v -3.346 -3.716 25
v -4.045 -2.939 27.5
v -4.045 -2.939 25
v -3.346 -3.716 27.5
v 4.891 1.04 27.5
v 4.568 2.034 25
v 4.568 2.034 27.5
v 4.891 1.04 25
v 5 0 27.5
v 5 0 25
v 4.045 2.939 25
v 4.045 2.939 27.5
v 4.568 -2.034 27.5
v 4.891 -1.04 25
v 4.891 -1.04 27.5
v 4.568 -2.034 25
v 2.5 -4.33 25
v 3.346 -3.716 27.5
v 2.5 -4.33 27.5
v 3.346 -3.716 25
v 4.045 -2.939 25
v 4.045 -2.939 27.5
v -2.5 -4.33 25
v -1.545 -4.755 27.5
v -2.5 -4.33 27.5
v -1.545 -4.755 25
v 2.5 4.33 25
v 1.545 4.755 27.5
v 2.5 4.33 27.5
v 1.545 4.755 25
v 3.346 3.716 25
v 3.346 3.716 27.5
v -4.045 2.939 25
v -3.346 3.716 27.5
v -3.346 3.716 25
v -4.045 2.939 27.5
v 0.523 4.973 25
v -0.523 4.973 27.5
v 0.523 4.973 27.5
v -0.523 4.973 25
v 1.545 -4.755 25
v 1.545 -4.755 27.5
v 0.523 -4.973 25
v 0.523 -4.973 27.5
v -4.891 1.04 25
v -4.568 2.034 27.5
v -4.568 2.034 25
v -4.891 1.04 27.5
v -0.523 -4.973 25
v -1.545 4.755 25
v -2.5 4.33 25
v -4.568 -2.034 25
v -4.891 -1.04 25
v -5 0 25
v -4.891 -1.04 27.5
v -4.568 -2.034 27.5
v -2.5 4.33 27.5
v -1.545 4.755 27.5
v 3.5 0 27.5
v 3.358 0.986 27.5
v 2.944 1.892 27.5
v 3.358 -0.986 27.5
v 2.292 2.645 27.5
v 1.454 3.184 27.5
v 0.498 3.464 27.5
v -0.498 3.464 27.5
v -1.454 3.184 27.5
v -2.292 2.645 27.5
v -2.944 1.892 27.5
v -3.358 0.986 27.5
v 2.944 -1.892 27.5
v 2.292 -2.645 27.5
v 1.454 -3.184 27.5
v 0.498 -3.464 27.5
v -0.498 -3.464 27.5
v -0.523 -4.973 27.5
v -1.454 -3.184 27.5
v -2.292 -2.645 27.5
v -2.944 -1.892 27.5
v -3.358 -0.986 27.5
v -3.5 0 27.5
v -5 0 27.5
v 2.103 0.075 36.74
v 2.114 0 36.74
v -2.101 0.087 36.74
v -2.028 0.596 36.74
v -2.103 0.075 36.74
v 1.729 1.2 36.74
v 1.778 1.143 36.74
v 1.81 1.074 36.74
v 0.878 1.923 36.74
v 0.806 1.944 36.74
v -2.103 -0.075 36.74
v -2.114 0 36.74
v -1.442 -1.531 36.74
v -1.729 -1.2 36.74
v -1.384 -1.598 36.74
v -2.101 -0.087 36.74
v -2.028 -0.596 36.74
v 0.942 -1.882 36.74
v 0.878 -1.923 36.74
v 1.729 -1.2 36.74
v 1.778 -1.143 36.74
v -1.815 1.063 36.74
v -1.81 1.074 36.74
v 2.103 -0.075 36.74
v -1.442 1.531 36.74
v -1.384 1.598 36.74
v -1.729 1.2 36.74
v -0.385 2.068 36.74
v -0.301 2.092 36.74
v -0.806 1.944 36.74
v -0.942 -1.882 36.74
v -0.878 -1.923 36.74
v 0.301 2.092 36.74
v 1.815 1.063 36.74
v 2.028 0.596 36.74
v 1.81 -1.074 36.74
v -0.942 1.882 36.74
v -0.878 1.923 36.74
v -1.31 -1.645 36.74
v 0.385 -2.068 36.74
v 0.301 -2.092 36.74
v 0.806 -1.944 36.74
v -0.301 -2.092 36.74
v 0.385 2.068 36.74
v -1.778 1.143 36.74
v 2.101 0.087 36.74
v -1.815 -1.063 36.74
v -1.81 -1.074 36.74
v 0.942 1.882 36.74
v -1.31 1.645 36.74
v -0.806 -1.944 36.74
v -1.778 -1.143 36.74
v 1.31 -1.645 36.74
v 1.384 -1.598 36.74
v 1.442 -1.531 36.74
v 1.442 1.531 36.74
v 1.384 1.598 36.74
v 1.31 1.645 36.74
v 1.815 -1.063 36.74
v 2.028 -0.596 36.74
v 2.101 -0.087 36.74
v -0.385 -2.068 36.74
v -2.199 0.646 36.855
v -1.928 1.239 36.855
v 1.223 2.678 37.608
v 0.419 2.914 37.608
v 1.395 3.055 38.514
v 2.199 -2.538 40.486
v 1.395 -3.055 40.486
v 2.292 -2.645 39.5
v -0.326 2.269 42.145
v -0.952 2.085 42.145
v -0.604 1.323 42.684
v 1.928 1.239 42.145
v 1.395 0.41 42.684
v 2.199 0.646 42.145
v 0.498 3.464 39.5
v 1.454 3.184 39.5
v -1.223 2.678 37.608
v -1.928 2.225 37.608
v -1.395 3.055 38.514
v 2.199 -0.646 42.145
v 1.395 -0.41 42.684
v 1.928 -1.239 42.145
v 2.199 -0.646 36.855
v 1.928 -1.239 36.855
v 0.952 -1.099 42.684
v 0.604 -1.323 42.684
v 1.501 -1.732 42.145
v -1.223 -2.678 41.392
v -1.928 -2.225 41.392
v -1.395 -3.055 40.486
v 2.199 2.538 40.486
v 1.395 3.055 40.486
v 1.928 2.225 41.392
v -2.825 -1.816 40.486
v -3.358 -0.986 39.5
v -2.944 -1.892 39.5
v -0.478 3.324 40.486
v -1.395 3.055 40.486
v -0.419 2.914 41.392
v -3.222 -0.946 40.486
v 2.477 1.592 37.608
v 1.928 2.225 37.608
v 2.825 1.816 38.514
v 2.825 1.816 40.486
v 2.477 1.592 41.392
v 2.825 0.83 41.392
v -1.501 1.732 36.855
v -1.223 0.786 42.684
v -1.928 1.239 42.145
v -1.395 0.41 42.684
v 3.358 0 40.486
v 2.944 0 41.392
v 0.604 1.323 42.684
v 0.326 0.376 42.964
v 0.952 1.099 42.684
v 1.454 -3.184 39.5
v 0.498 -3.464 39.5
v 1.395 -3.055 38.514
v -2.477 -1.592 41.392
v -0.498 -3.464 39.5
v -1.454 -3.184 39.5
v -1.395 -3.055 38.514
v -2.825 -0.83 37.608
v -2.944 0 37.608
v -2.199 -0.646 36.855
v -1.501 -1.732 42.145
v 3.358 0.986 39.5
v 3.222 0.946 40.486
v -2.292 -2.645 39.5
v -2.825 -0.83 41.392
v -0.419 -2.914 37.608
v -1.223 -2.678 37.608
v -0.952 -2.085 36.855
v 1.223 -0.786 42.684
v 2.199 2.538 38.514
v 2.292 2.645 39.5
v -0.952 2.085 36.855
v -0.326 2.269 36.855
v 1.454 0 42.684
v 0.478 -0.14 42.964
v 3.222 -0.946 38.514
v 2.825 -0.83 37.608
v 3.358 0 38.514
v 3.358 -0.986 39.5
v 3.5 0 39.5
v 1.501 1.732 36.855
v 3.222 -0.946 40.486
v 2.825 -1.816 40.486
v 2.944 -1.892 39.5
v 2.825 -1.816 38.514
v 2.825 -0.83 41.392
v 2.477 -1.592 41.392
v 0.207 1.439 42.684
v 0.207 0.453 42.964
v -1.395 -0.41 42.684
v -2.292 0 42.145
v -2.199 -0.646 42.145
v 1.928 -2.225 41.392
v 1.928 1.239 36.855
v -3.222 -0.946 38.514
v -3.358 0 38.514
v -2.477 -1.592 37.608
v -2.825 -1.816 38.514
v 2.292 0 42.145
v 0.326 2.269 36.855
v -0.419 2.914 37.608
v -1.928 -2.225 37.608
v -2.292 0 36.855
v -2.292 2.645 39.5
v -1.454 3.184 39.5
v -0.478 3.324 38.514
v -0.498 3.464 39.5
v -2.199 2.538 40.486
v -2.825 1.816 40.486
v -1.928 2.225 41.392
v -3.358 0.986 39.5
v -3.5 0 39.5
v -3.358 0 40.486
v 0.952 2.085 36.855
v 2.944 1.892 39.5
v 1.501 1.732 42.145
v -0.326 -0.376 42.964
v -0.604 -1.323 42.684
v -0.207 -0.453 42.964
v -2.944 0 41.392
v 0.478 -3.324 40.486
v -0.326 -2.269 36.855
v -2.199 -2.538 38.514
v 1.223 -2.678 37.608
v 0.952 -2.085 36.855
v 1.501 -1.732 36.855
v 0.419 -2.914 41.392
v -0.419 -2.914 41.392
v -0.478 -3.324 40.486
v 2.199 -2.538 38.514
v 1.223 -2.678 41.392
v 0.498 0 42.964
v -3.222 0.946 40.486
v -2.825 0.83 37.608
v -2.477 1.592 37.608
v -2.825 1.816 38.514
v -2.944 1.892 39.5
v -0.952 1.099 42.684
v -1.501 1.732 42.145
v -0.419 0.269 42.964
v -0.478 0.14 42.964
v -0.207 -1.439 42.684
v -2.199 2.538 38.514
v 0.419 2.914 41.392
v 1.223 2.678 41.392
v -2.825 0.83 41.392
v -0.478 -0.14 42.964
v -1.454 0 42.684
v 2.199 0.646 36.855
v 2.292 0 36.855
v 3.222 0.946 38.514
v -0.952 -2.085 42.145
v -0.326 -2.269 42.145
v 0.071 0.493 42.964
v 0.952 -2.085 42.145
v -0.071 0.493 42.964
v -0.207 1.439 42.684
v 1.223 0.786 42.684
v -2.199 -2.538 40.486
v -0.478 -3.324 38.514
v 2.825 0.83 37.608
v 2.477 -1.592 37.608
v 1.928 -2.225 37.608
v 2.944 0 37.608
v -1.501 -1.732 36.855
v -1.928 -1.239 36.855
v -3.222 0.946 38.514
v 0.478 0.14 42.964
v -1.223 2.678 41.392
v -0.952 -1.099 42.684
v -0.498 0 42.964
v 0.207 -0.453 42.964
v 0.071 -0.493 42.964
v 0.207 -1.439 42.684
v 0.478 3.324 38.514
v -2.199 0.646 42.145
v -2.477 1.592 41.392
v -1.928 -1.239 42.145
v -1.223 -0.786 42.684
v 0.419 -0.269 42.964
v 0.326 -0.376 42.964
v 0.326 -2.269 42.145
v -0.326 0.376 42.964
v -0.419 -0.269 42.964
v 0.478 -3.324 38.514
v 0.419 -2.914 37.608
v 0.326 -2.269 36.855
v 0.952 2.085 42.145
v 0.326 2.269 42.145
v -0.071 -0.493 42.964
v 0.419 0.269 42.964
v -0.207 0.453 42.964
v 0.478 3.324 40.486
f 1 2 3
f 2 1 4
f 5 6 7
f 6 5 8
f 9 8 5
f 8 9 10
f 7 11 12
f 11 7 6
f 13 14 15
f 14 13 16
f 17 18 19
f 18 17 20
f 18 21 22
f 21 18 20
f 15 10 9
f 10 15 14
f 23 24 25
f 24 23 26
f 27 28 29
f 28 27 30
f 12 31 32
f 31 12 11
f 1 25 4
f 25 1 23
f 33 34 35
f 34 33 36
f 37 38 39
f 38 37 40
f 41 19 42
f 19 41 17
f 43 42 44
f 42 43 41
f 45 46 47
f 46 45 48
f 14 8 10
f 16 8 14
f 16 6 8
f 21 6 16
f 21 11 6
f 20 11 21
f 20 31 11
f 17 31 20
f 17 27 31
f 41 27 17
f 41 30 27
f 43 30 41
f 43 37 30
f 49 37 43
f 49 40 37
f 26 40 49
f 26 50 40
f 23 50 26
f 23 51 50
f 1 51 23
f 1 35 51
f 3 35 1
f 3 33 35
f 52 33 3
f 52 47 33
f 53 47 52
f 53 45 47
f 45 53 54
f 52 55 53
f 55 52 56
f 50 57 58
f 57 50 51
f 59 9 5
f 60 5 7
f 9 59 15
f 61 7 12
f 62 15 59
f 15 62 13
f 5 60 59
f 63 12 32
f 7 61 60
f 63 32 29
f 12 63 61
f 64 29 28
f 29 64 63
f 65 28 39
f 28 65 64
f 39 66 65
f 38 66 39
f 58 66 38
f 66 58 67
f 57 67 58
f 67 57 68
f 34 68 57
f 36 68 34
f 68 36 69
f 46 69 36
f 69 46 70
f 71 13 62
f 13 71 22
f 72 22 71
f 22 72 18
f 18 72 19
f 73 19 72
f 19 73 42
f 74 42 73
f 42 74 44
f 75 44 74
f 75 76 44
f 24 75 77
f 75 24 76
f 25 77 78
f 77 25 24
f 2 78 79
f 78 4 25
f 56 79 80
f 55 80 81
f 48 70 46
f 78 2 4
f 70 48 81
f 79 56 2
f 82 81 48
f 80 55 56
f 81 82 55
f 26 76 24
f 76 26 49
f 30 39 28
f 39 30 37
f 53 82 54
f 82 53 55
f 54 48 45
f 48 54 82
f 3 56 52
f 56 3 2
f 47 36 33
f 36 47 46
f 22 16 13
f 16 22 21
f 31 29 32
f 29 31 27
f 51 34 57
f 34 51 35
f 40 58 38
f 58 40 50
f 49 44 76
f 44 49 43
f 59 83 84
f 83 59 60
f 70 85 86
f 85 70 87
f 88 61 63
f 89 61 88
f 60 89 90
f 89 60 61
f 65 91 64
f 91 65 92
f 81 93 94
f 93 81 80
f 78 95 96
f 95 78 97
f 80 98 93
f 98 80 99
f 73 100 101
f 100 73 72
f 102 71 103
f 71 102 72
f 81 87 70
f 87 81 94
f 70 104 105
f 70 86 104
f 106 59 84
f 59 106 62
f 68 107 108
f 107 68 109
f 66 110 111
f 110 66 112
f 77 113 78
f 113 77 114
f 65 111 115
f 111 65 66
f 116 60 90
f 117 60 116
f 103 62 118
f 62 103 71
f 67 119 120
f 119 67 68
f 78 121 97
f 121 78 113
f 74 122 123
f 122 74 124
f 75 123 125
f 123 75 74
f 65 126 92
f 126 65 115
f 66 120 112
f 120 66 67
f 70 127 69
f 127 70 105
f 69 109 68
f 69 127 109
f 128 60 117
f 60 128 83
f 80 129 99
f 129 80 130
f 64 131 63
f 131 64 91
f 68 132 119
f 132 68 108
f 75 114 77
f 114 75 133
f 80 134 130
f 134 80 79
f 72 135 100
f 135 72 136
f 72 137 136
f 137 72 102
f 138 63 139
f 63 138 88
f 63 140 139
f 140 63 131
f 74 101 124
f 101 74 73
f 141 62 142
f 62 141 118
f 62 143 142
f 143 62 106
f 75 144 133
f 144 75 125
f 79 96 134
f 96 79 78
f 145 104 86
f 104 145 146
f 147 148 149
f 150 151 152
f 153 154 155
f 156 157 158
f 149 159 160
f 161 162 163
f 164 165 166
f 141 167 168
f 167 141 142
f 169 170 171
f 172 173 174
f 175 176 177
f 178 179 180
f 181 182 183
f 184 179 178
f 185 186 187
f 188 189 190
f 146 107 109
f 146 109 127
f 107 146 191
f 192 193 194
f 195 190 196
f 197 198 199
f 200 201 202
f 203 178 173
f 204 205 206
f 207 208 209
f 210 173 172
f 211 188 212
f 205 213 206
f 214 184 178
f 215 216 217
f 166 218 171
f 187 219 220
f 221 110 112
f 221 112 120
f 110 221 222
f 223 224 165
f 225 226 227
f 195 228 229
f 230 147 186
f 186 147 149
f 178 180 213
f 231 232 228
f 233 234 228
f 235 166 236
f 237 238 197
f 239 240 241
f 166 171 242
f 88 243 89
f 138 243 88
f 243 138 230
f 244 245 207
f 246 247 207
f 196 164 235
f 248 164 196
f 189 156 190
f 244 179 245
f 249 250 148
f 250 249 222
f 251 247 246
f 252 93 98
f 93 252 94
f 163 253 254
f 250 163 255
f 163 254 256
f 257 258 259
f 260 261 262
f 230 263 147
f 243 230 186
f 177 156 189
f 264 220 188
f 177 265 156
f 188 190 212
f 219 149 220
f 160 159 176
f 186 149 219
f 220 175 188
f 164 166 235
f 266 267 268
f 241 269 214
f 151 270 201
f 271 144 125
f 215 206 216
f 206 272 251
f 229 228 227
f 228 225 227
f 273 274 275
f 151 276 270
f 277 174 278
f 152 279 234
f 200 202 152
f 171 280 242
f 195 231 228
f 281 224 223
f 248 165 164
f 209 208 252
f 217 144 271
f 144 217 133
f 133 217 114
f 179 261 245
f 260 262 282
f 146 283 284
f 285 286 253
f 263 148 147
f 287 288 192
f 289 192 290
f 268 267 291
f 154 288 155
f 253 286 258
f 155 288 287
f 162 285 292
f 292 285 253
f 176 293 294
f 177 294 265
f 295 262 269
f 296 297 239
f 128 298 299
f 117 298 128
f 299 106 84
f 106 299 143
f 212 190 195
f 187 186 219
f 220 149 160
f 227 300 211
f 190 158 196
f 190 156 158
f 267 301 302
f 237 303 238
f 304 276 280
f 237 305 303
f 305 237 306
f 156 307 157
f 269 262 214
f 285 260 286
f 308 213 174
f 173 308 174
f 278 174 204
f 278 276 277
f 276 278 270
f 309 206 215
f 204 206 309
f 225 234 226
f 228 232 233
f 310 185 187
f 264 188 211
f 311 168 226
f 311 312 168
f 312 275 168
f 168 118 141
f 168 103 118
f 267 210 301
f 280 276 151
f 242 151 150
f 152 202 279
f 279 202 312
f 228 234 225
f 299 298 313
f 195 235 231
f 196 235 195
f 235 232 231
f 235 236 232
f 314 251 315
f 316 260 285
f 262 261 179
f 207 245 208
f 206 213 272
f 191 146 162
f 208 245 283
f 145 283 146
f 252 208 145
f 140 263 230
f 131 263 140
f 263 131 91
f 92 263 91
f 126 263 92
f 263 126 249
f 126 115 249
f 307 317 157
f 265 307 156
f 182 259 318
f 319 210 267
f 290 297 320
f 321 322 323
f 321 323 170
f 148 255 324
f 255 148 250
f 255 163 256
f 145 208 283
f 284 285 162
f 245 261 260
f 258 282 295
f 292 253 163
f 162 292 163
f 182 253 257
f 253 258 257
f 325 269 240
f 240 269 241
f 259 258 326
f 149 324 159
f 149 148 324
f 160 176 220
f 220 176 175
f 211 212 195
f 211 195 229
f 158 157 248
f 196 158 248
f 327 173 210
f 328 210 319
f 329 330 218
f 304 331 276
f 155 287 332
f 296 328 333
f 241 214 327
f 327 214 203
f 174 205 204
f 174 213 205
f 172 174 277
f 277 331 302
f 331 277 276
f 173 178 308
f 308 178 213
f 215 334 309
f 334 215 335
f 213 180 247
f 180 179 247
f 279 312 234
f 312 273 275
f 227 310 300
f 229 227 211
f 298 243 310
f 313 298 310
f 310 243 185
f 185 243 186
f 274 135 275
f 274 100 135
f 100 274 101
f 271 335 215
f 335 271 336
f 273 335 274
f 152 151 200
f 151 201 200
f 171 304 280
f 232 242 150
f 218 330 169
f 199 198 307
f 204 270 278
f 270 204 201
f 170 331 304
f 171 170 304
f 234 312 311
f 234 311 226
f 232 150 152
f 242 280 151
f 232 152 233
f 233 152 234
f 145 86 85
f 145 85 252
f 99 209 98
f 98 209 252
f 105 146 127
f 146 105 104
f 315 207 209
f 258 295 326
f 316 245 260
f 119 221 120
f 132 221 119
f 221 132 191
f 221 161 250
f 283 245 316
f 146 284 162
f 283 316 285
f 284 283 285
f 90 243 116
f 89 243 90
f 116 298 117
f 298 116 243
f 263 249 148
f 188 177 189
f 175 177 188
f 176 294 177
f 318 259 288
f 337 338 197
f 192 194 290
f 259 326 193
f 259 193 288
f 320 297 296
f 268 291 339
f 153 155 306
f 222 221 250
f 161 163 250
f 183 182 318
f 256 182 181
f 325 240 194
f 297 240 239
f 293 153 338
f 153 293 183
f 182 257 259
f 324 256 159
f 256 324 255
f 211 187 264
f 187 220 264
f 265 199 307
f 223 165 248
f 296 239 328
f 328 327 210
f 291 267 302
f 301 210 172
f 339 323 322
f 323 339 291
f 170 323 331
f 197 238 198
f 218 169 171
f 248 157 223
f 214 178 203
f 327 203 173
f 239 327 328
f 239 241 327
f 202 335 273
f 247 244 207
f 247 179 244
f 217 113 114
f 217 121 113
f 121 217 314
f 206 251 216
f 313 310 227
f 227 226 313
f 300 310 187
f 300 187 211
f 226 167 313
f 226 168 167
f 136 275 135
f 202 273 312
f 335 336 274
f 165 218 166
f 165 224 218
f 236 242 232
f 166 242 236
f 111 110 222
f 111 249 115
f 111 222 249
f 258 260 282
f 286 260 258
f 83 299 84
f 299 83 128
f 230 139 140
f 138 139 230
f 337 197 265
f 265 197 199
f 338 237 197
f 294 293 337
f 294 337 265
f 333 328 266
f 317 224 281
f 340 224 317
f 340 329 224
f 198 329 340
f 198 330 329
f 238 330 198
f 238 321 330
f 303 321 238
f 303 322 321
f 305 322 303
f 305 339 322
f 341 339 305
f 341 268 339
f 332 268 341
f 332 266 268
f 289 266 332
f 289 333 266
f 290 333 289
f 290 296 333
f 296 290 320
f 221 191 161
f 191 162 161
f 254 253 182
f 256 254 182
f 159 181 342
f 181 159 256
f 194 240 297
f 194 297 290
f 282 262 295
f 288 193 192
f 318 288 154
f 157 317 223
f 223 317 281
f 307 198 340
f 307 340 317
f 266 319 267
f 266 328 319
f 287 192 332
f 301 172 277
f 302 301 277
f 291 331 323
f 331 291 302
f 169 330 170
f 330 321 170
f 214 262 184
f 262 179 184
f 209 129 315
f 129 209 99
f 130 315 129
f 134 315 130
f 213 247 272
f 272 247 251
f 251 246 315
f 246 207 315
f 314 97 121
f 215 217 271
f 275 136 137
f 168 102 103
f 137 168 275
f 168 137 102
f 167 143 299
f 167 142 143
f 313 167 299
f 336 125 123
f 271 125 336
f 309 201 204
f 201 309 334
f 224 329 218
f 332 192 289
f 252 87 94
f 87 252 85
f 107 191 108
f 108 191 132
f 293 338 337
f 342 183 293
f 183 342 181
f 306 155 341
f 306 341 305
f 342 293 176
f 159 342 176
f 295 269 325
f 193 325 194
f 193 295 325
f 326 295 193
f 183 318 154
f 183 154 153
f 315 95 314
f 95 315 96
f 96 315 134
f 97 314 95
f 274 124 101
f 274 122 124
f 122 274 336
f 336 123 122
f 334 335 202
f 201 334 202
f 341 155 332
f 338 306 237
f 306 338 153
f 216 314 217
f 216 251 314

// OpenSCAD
//пешка 

module pawn() {
  scale([.5, .5, .5])
  translate ([0,0,50])
	union(){
translate ([0,0,0])cylinder(5,10,10);
translate ([0,0,5])cylinder (20,7,4);
translate ([0,0,29]) sphere (7);
	}
}
pawn();
